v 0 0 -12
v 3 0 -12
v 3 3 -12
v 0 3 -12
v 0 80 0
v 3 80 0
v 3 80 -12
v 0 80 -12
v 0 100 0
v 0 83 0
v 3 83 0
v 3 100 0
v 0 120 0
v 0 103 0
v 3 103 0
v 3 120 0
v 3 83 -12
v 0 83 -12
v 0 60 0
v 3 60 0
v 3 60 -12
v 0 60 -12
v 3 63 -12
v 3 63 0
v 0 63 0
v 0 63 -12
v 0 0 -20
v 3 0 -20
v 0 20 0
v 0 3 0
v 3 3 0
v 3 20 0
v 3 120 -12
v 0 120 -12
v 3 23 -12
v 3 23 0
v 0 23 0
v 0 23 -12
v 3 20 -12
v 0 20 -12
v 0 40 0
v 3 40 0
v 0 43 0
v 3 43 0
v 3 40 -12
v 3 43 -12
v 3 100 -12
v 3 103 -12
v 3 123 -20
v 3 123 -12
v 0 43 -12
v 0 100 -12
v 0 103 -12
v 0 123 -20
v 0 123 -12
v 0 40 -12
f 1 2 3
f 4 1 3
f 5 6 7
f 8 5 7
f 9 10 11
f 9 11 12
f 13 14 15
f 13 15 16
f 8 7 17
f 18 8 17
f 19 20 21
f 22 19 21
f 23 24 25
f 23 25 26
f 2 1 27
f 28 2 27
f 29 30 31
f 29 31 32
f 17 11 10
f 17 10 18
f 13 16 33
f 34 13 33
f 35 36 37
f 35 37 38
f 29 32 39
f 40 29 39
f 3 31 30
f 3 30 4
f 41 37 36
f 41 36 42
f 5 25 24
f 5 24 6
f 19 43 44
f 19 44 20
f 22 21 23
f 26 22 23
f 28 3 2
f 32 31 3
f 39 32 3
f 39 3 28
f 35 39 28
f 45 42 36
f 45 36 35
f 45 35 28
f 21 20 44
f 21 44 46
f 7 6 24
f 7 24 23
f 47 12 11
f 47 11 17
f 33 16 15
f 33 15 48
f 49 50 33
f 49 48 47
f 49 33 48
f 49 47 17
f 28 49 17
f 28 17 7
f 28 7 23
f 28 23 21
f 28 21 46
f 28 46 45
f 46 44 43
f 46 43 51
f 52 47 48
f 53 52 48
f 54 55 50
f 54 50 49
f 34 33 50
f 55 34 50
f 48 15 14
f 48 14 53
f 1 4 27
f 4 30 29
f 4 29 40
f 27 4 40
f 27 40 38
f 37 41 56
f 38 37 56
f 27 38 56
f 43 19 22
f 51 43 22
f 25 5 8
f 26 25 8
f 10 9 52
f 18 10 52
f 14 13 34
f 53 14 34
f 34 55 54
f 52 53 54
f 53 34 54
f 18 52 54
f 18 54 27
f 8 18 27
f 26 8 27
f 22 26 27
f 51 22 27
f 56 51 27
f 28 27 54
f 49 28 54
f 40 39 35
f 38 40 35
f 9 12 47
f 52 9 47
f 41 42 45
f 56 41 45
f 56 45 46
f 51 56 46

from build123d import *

# Parameters (mm, degrees)
SKETCH1_W           = 20
SKETCH1_H           = 123
BOSS_EXTRUDE1_DEPTH = 3
SKETCH2_W           = 12
SKETCH2_H           = 3
CUT_EXTRUDE1_DEPTH  = 125.651514231
LPATTERN1_COUNT     = 7
LPATTERN1_PITCH     = 20


with BuildPart() as part:
    # Sketch1 → Boss-Extrude1 (new body)
    with BuildSketch(Plane(origin=(0, 0, 0), x_dir=(0, 0, -1), z_dir=(1, 0, 0))):
        with Locations((10, 61.5)):
            Rectangle(SKETCH1_W, SKETCH1_H)
    extrude(amount=BOSS_EXTRUDE1_DEPTH)

    # Sketch2 → Cut-Extrude1 (cut, through all)
    with BuildSketch(Plane(origin=(3, 0, 0), x_dir=(0, 0, -1), z_dir=(1, 0, 0))):
        with Locations((6, 1.5)):
            Rectangle(SKETCH2_W, SKETCH2_H)
    cut_extrude1 = extrude(amount=-CUT_EXTRUDE1_DEPTH, mode=Mode.SUBTRACT)

    # LPattern1: Cut-Extrude1 ×7
    with Locations(*[(0, i * LPATTERN1_PITCH, 0) for i in range(1, LPATTERN1_COUNT)]):
        add(cut_extrude1, mode=Mode.SUBTRACT)


solid = part.part
